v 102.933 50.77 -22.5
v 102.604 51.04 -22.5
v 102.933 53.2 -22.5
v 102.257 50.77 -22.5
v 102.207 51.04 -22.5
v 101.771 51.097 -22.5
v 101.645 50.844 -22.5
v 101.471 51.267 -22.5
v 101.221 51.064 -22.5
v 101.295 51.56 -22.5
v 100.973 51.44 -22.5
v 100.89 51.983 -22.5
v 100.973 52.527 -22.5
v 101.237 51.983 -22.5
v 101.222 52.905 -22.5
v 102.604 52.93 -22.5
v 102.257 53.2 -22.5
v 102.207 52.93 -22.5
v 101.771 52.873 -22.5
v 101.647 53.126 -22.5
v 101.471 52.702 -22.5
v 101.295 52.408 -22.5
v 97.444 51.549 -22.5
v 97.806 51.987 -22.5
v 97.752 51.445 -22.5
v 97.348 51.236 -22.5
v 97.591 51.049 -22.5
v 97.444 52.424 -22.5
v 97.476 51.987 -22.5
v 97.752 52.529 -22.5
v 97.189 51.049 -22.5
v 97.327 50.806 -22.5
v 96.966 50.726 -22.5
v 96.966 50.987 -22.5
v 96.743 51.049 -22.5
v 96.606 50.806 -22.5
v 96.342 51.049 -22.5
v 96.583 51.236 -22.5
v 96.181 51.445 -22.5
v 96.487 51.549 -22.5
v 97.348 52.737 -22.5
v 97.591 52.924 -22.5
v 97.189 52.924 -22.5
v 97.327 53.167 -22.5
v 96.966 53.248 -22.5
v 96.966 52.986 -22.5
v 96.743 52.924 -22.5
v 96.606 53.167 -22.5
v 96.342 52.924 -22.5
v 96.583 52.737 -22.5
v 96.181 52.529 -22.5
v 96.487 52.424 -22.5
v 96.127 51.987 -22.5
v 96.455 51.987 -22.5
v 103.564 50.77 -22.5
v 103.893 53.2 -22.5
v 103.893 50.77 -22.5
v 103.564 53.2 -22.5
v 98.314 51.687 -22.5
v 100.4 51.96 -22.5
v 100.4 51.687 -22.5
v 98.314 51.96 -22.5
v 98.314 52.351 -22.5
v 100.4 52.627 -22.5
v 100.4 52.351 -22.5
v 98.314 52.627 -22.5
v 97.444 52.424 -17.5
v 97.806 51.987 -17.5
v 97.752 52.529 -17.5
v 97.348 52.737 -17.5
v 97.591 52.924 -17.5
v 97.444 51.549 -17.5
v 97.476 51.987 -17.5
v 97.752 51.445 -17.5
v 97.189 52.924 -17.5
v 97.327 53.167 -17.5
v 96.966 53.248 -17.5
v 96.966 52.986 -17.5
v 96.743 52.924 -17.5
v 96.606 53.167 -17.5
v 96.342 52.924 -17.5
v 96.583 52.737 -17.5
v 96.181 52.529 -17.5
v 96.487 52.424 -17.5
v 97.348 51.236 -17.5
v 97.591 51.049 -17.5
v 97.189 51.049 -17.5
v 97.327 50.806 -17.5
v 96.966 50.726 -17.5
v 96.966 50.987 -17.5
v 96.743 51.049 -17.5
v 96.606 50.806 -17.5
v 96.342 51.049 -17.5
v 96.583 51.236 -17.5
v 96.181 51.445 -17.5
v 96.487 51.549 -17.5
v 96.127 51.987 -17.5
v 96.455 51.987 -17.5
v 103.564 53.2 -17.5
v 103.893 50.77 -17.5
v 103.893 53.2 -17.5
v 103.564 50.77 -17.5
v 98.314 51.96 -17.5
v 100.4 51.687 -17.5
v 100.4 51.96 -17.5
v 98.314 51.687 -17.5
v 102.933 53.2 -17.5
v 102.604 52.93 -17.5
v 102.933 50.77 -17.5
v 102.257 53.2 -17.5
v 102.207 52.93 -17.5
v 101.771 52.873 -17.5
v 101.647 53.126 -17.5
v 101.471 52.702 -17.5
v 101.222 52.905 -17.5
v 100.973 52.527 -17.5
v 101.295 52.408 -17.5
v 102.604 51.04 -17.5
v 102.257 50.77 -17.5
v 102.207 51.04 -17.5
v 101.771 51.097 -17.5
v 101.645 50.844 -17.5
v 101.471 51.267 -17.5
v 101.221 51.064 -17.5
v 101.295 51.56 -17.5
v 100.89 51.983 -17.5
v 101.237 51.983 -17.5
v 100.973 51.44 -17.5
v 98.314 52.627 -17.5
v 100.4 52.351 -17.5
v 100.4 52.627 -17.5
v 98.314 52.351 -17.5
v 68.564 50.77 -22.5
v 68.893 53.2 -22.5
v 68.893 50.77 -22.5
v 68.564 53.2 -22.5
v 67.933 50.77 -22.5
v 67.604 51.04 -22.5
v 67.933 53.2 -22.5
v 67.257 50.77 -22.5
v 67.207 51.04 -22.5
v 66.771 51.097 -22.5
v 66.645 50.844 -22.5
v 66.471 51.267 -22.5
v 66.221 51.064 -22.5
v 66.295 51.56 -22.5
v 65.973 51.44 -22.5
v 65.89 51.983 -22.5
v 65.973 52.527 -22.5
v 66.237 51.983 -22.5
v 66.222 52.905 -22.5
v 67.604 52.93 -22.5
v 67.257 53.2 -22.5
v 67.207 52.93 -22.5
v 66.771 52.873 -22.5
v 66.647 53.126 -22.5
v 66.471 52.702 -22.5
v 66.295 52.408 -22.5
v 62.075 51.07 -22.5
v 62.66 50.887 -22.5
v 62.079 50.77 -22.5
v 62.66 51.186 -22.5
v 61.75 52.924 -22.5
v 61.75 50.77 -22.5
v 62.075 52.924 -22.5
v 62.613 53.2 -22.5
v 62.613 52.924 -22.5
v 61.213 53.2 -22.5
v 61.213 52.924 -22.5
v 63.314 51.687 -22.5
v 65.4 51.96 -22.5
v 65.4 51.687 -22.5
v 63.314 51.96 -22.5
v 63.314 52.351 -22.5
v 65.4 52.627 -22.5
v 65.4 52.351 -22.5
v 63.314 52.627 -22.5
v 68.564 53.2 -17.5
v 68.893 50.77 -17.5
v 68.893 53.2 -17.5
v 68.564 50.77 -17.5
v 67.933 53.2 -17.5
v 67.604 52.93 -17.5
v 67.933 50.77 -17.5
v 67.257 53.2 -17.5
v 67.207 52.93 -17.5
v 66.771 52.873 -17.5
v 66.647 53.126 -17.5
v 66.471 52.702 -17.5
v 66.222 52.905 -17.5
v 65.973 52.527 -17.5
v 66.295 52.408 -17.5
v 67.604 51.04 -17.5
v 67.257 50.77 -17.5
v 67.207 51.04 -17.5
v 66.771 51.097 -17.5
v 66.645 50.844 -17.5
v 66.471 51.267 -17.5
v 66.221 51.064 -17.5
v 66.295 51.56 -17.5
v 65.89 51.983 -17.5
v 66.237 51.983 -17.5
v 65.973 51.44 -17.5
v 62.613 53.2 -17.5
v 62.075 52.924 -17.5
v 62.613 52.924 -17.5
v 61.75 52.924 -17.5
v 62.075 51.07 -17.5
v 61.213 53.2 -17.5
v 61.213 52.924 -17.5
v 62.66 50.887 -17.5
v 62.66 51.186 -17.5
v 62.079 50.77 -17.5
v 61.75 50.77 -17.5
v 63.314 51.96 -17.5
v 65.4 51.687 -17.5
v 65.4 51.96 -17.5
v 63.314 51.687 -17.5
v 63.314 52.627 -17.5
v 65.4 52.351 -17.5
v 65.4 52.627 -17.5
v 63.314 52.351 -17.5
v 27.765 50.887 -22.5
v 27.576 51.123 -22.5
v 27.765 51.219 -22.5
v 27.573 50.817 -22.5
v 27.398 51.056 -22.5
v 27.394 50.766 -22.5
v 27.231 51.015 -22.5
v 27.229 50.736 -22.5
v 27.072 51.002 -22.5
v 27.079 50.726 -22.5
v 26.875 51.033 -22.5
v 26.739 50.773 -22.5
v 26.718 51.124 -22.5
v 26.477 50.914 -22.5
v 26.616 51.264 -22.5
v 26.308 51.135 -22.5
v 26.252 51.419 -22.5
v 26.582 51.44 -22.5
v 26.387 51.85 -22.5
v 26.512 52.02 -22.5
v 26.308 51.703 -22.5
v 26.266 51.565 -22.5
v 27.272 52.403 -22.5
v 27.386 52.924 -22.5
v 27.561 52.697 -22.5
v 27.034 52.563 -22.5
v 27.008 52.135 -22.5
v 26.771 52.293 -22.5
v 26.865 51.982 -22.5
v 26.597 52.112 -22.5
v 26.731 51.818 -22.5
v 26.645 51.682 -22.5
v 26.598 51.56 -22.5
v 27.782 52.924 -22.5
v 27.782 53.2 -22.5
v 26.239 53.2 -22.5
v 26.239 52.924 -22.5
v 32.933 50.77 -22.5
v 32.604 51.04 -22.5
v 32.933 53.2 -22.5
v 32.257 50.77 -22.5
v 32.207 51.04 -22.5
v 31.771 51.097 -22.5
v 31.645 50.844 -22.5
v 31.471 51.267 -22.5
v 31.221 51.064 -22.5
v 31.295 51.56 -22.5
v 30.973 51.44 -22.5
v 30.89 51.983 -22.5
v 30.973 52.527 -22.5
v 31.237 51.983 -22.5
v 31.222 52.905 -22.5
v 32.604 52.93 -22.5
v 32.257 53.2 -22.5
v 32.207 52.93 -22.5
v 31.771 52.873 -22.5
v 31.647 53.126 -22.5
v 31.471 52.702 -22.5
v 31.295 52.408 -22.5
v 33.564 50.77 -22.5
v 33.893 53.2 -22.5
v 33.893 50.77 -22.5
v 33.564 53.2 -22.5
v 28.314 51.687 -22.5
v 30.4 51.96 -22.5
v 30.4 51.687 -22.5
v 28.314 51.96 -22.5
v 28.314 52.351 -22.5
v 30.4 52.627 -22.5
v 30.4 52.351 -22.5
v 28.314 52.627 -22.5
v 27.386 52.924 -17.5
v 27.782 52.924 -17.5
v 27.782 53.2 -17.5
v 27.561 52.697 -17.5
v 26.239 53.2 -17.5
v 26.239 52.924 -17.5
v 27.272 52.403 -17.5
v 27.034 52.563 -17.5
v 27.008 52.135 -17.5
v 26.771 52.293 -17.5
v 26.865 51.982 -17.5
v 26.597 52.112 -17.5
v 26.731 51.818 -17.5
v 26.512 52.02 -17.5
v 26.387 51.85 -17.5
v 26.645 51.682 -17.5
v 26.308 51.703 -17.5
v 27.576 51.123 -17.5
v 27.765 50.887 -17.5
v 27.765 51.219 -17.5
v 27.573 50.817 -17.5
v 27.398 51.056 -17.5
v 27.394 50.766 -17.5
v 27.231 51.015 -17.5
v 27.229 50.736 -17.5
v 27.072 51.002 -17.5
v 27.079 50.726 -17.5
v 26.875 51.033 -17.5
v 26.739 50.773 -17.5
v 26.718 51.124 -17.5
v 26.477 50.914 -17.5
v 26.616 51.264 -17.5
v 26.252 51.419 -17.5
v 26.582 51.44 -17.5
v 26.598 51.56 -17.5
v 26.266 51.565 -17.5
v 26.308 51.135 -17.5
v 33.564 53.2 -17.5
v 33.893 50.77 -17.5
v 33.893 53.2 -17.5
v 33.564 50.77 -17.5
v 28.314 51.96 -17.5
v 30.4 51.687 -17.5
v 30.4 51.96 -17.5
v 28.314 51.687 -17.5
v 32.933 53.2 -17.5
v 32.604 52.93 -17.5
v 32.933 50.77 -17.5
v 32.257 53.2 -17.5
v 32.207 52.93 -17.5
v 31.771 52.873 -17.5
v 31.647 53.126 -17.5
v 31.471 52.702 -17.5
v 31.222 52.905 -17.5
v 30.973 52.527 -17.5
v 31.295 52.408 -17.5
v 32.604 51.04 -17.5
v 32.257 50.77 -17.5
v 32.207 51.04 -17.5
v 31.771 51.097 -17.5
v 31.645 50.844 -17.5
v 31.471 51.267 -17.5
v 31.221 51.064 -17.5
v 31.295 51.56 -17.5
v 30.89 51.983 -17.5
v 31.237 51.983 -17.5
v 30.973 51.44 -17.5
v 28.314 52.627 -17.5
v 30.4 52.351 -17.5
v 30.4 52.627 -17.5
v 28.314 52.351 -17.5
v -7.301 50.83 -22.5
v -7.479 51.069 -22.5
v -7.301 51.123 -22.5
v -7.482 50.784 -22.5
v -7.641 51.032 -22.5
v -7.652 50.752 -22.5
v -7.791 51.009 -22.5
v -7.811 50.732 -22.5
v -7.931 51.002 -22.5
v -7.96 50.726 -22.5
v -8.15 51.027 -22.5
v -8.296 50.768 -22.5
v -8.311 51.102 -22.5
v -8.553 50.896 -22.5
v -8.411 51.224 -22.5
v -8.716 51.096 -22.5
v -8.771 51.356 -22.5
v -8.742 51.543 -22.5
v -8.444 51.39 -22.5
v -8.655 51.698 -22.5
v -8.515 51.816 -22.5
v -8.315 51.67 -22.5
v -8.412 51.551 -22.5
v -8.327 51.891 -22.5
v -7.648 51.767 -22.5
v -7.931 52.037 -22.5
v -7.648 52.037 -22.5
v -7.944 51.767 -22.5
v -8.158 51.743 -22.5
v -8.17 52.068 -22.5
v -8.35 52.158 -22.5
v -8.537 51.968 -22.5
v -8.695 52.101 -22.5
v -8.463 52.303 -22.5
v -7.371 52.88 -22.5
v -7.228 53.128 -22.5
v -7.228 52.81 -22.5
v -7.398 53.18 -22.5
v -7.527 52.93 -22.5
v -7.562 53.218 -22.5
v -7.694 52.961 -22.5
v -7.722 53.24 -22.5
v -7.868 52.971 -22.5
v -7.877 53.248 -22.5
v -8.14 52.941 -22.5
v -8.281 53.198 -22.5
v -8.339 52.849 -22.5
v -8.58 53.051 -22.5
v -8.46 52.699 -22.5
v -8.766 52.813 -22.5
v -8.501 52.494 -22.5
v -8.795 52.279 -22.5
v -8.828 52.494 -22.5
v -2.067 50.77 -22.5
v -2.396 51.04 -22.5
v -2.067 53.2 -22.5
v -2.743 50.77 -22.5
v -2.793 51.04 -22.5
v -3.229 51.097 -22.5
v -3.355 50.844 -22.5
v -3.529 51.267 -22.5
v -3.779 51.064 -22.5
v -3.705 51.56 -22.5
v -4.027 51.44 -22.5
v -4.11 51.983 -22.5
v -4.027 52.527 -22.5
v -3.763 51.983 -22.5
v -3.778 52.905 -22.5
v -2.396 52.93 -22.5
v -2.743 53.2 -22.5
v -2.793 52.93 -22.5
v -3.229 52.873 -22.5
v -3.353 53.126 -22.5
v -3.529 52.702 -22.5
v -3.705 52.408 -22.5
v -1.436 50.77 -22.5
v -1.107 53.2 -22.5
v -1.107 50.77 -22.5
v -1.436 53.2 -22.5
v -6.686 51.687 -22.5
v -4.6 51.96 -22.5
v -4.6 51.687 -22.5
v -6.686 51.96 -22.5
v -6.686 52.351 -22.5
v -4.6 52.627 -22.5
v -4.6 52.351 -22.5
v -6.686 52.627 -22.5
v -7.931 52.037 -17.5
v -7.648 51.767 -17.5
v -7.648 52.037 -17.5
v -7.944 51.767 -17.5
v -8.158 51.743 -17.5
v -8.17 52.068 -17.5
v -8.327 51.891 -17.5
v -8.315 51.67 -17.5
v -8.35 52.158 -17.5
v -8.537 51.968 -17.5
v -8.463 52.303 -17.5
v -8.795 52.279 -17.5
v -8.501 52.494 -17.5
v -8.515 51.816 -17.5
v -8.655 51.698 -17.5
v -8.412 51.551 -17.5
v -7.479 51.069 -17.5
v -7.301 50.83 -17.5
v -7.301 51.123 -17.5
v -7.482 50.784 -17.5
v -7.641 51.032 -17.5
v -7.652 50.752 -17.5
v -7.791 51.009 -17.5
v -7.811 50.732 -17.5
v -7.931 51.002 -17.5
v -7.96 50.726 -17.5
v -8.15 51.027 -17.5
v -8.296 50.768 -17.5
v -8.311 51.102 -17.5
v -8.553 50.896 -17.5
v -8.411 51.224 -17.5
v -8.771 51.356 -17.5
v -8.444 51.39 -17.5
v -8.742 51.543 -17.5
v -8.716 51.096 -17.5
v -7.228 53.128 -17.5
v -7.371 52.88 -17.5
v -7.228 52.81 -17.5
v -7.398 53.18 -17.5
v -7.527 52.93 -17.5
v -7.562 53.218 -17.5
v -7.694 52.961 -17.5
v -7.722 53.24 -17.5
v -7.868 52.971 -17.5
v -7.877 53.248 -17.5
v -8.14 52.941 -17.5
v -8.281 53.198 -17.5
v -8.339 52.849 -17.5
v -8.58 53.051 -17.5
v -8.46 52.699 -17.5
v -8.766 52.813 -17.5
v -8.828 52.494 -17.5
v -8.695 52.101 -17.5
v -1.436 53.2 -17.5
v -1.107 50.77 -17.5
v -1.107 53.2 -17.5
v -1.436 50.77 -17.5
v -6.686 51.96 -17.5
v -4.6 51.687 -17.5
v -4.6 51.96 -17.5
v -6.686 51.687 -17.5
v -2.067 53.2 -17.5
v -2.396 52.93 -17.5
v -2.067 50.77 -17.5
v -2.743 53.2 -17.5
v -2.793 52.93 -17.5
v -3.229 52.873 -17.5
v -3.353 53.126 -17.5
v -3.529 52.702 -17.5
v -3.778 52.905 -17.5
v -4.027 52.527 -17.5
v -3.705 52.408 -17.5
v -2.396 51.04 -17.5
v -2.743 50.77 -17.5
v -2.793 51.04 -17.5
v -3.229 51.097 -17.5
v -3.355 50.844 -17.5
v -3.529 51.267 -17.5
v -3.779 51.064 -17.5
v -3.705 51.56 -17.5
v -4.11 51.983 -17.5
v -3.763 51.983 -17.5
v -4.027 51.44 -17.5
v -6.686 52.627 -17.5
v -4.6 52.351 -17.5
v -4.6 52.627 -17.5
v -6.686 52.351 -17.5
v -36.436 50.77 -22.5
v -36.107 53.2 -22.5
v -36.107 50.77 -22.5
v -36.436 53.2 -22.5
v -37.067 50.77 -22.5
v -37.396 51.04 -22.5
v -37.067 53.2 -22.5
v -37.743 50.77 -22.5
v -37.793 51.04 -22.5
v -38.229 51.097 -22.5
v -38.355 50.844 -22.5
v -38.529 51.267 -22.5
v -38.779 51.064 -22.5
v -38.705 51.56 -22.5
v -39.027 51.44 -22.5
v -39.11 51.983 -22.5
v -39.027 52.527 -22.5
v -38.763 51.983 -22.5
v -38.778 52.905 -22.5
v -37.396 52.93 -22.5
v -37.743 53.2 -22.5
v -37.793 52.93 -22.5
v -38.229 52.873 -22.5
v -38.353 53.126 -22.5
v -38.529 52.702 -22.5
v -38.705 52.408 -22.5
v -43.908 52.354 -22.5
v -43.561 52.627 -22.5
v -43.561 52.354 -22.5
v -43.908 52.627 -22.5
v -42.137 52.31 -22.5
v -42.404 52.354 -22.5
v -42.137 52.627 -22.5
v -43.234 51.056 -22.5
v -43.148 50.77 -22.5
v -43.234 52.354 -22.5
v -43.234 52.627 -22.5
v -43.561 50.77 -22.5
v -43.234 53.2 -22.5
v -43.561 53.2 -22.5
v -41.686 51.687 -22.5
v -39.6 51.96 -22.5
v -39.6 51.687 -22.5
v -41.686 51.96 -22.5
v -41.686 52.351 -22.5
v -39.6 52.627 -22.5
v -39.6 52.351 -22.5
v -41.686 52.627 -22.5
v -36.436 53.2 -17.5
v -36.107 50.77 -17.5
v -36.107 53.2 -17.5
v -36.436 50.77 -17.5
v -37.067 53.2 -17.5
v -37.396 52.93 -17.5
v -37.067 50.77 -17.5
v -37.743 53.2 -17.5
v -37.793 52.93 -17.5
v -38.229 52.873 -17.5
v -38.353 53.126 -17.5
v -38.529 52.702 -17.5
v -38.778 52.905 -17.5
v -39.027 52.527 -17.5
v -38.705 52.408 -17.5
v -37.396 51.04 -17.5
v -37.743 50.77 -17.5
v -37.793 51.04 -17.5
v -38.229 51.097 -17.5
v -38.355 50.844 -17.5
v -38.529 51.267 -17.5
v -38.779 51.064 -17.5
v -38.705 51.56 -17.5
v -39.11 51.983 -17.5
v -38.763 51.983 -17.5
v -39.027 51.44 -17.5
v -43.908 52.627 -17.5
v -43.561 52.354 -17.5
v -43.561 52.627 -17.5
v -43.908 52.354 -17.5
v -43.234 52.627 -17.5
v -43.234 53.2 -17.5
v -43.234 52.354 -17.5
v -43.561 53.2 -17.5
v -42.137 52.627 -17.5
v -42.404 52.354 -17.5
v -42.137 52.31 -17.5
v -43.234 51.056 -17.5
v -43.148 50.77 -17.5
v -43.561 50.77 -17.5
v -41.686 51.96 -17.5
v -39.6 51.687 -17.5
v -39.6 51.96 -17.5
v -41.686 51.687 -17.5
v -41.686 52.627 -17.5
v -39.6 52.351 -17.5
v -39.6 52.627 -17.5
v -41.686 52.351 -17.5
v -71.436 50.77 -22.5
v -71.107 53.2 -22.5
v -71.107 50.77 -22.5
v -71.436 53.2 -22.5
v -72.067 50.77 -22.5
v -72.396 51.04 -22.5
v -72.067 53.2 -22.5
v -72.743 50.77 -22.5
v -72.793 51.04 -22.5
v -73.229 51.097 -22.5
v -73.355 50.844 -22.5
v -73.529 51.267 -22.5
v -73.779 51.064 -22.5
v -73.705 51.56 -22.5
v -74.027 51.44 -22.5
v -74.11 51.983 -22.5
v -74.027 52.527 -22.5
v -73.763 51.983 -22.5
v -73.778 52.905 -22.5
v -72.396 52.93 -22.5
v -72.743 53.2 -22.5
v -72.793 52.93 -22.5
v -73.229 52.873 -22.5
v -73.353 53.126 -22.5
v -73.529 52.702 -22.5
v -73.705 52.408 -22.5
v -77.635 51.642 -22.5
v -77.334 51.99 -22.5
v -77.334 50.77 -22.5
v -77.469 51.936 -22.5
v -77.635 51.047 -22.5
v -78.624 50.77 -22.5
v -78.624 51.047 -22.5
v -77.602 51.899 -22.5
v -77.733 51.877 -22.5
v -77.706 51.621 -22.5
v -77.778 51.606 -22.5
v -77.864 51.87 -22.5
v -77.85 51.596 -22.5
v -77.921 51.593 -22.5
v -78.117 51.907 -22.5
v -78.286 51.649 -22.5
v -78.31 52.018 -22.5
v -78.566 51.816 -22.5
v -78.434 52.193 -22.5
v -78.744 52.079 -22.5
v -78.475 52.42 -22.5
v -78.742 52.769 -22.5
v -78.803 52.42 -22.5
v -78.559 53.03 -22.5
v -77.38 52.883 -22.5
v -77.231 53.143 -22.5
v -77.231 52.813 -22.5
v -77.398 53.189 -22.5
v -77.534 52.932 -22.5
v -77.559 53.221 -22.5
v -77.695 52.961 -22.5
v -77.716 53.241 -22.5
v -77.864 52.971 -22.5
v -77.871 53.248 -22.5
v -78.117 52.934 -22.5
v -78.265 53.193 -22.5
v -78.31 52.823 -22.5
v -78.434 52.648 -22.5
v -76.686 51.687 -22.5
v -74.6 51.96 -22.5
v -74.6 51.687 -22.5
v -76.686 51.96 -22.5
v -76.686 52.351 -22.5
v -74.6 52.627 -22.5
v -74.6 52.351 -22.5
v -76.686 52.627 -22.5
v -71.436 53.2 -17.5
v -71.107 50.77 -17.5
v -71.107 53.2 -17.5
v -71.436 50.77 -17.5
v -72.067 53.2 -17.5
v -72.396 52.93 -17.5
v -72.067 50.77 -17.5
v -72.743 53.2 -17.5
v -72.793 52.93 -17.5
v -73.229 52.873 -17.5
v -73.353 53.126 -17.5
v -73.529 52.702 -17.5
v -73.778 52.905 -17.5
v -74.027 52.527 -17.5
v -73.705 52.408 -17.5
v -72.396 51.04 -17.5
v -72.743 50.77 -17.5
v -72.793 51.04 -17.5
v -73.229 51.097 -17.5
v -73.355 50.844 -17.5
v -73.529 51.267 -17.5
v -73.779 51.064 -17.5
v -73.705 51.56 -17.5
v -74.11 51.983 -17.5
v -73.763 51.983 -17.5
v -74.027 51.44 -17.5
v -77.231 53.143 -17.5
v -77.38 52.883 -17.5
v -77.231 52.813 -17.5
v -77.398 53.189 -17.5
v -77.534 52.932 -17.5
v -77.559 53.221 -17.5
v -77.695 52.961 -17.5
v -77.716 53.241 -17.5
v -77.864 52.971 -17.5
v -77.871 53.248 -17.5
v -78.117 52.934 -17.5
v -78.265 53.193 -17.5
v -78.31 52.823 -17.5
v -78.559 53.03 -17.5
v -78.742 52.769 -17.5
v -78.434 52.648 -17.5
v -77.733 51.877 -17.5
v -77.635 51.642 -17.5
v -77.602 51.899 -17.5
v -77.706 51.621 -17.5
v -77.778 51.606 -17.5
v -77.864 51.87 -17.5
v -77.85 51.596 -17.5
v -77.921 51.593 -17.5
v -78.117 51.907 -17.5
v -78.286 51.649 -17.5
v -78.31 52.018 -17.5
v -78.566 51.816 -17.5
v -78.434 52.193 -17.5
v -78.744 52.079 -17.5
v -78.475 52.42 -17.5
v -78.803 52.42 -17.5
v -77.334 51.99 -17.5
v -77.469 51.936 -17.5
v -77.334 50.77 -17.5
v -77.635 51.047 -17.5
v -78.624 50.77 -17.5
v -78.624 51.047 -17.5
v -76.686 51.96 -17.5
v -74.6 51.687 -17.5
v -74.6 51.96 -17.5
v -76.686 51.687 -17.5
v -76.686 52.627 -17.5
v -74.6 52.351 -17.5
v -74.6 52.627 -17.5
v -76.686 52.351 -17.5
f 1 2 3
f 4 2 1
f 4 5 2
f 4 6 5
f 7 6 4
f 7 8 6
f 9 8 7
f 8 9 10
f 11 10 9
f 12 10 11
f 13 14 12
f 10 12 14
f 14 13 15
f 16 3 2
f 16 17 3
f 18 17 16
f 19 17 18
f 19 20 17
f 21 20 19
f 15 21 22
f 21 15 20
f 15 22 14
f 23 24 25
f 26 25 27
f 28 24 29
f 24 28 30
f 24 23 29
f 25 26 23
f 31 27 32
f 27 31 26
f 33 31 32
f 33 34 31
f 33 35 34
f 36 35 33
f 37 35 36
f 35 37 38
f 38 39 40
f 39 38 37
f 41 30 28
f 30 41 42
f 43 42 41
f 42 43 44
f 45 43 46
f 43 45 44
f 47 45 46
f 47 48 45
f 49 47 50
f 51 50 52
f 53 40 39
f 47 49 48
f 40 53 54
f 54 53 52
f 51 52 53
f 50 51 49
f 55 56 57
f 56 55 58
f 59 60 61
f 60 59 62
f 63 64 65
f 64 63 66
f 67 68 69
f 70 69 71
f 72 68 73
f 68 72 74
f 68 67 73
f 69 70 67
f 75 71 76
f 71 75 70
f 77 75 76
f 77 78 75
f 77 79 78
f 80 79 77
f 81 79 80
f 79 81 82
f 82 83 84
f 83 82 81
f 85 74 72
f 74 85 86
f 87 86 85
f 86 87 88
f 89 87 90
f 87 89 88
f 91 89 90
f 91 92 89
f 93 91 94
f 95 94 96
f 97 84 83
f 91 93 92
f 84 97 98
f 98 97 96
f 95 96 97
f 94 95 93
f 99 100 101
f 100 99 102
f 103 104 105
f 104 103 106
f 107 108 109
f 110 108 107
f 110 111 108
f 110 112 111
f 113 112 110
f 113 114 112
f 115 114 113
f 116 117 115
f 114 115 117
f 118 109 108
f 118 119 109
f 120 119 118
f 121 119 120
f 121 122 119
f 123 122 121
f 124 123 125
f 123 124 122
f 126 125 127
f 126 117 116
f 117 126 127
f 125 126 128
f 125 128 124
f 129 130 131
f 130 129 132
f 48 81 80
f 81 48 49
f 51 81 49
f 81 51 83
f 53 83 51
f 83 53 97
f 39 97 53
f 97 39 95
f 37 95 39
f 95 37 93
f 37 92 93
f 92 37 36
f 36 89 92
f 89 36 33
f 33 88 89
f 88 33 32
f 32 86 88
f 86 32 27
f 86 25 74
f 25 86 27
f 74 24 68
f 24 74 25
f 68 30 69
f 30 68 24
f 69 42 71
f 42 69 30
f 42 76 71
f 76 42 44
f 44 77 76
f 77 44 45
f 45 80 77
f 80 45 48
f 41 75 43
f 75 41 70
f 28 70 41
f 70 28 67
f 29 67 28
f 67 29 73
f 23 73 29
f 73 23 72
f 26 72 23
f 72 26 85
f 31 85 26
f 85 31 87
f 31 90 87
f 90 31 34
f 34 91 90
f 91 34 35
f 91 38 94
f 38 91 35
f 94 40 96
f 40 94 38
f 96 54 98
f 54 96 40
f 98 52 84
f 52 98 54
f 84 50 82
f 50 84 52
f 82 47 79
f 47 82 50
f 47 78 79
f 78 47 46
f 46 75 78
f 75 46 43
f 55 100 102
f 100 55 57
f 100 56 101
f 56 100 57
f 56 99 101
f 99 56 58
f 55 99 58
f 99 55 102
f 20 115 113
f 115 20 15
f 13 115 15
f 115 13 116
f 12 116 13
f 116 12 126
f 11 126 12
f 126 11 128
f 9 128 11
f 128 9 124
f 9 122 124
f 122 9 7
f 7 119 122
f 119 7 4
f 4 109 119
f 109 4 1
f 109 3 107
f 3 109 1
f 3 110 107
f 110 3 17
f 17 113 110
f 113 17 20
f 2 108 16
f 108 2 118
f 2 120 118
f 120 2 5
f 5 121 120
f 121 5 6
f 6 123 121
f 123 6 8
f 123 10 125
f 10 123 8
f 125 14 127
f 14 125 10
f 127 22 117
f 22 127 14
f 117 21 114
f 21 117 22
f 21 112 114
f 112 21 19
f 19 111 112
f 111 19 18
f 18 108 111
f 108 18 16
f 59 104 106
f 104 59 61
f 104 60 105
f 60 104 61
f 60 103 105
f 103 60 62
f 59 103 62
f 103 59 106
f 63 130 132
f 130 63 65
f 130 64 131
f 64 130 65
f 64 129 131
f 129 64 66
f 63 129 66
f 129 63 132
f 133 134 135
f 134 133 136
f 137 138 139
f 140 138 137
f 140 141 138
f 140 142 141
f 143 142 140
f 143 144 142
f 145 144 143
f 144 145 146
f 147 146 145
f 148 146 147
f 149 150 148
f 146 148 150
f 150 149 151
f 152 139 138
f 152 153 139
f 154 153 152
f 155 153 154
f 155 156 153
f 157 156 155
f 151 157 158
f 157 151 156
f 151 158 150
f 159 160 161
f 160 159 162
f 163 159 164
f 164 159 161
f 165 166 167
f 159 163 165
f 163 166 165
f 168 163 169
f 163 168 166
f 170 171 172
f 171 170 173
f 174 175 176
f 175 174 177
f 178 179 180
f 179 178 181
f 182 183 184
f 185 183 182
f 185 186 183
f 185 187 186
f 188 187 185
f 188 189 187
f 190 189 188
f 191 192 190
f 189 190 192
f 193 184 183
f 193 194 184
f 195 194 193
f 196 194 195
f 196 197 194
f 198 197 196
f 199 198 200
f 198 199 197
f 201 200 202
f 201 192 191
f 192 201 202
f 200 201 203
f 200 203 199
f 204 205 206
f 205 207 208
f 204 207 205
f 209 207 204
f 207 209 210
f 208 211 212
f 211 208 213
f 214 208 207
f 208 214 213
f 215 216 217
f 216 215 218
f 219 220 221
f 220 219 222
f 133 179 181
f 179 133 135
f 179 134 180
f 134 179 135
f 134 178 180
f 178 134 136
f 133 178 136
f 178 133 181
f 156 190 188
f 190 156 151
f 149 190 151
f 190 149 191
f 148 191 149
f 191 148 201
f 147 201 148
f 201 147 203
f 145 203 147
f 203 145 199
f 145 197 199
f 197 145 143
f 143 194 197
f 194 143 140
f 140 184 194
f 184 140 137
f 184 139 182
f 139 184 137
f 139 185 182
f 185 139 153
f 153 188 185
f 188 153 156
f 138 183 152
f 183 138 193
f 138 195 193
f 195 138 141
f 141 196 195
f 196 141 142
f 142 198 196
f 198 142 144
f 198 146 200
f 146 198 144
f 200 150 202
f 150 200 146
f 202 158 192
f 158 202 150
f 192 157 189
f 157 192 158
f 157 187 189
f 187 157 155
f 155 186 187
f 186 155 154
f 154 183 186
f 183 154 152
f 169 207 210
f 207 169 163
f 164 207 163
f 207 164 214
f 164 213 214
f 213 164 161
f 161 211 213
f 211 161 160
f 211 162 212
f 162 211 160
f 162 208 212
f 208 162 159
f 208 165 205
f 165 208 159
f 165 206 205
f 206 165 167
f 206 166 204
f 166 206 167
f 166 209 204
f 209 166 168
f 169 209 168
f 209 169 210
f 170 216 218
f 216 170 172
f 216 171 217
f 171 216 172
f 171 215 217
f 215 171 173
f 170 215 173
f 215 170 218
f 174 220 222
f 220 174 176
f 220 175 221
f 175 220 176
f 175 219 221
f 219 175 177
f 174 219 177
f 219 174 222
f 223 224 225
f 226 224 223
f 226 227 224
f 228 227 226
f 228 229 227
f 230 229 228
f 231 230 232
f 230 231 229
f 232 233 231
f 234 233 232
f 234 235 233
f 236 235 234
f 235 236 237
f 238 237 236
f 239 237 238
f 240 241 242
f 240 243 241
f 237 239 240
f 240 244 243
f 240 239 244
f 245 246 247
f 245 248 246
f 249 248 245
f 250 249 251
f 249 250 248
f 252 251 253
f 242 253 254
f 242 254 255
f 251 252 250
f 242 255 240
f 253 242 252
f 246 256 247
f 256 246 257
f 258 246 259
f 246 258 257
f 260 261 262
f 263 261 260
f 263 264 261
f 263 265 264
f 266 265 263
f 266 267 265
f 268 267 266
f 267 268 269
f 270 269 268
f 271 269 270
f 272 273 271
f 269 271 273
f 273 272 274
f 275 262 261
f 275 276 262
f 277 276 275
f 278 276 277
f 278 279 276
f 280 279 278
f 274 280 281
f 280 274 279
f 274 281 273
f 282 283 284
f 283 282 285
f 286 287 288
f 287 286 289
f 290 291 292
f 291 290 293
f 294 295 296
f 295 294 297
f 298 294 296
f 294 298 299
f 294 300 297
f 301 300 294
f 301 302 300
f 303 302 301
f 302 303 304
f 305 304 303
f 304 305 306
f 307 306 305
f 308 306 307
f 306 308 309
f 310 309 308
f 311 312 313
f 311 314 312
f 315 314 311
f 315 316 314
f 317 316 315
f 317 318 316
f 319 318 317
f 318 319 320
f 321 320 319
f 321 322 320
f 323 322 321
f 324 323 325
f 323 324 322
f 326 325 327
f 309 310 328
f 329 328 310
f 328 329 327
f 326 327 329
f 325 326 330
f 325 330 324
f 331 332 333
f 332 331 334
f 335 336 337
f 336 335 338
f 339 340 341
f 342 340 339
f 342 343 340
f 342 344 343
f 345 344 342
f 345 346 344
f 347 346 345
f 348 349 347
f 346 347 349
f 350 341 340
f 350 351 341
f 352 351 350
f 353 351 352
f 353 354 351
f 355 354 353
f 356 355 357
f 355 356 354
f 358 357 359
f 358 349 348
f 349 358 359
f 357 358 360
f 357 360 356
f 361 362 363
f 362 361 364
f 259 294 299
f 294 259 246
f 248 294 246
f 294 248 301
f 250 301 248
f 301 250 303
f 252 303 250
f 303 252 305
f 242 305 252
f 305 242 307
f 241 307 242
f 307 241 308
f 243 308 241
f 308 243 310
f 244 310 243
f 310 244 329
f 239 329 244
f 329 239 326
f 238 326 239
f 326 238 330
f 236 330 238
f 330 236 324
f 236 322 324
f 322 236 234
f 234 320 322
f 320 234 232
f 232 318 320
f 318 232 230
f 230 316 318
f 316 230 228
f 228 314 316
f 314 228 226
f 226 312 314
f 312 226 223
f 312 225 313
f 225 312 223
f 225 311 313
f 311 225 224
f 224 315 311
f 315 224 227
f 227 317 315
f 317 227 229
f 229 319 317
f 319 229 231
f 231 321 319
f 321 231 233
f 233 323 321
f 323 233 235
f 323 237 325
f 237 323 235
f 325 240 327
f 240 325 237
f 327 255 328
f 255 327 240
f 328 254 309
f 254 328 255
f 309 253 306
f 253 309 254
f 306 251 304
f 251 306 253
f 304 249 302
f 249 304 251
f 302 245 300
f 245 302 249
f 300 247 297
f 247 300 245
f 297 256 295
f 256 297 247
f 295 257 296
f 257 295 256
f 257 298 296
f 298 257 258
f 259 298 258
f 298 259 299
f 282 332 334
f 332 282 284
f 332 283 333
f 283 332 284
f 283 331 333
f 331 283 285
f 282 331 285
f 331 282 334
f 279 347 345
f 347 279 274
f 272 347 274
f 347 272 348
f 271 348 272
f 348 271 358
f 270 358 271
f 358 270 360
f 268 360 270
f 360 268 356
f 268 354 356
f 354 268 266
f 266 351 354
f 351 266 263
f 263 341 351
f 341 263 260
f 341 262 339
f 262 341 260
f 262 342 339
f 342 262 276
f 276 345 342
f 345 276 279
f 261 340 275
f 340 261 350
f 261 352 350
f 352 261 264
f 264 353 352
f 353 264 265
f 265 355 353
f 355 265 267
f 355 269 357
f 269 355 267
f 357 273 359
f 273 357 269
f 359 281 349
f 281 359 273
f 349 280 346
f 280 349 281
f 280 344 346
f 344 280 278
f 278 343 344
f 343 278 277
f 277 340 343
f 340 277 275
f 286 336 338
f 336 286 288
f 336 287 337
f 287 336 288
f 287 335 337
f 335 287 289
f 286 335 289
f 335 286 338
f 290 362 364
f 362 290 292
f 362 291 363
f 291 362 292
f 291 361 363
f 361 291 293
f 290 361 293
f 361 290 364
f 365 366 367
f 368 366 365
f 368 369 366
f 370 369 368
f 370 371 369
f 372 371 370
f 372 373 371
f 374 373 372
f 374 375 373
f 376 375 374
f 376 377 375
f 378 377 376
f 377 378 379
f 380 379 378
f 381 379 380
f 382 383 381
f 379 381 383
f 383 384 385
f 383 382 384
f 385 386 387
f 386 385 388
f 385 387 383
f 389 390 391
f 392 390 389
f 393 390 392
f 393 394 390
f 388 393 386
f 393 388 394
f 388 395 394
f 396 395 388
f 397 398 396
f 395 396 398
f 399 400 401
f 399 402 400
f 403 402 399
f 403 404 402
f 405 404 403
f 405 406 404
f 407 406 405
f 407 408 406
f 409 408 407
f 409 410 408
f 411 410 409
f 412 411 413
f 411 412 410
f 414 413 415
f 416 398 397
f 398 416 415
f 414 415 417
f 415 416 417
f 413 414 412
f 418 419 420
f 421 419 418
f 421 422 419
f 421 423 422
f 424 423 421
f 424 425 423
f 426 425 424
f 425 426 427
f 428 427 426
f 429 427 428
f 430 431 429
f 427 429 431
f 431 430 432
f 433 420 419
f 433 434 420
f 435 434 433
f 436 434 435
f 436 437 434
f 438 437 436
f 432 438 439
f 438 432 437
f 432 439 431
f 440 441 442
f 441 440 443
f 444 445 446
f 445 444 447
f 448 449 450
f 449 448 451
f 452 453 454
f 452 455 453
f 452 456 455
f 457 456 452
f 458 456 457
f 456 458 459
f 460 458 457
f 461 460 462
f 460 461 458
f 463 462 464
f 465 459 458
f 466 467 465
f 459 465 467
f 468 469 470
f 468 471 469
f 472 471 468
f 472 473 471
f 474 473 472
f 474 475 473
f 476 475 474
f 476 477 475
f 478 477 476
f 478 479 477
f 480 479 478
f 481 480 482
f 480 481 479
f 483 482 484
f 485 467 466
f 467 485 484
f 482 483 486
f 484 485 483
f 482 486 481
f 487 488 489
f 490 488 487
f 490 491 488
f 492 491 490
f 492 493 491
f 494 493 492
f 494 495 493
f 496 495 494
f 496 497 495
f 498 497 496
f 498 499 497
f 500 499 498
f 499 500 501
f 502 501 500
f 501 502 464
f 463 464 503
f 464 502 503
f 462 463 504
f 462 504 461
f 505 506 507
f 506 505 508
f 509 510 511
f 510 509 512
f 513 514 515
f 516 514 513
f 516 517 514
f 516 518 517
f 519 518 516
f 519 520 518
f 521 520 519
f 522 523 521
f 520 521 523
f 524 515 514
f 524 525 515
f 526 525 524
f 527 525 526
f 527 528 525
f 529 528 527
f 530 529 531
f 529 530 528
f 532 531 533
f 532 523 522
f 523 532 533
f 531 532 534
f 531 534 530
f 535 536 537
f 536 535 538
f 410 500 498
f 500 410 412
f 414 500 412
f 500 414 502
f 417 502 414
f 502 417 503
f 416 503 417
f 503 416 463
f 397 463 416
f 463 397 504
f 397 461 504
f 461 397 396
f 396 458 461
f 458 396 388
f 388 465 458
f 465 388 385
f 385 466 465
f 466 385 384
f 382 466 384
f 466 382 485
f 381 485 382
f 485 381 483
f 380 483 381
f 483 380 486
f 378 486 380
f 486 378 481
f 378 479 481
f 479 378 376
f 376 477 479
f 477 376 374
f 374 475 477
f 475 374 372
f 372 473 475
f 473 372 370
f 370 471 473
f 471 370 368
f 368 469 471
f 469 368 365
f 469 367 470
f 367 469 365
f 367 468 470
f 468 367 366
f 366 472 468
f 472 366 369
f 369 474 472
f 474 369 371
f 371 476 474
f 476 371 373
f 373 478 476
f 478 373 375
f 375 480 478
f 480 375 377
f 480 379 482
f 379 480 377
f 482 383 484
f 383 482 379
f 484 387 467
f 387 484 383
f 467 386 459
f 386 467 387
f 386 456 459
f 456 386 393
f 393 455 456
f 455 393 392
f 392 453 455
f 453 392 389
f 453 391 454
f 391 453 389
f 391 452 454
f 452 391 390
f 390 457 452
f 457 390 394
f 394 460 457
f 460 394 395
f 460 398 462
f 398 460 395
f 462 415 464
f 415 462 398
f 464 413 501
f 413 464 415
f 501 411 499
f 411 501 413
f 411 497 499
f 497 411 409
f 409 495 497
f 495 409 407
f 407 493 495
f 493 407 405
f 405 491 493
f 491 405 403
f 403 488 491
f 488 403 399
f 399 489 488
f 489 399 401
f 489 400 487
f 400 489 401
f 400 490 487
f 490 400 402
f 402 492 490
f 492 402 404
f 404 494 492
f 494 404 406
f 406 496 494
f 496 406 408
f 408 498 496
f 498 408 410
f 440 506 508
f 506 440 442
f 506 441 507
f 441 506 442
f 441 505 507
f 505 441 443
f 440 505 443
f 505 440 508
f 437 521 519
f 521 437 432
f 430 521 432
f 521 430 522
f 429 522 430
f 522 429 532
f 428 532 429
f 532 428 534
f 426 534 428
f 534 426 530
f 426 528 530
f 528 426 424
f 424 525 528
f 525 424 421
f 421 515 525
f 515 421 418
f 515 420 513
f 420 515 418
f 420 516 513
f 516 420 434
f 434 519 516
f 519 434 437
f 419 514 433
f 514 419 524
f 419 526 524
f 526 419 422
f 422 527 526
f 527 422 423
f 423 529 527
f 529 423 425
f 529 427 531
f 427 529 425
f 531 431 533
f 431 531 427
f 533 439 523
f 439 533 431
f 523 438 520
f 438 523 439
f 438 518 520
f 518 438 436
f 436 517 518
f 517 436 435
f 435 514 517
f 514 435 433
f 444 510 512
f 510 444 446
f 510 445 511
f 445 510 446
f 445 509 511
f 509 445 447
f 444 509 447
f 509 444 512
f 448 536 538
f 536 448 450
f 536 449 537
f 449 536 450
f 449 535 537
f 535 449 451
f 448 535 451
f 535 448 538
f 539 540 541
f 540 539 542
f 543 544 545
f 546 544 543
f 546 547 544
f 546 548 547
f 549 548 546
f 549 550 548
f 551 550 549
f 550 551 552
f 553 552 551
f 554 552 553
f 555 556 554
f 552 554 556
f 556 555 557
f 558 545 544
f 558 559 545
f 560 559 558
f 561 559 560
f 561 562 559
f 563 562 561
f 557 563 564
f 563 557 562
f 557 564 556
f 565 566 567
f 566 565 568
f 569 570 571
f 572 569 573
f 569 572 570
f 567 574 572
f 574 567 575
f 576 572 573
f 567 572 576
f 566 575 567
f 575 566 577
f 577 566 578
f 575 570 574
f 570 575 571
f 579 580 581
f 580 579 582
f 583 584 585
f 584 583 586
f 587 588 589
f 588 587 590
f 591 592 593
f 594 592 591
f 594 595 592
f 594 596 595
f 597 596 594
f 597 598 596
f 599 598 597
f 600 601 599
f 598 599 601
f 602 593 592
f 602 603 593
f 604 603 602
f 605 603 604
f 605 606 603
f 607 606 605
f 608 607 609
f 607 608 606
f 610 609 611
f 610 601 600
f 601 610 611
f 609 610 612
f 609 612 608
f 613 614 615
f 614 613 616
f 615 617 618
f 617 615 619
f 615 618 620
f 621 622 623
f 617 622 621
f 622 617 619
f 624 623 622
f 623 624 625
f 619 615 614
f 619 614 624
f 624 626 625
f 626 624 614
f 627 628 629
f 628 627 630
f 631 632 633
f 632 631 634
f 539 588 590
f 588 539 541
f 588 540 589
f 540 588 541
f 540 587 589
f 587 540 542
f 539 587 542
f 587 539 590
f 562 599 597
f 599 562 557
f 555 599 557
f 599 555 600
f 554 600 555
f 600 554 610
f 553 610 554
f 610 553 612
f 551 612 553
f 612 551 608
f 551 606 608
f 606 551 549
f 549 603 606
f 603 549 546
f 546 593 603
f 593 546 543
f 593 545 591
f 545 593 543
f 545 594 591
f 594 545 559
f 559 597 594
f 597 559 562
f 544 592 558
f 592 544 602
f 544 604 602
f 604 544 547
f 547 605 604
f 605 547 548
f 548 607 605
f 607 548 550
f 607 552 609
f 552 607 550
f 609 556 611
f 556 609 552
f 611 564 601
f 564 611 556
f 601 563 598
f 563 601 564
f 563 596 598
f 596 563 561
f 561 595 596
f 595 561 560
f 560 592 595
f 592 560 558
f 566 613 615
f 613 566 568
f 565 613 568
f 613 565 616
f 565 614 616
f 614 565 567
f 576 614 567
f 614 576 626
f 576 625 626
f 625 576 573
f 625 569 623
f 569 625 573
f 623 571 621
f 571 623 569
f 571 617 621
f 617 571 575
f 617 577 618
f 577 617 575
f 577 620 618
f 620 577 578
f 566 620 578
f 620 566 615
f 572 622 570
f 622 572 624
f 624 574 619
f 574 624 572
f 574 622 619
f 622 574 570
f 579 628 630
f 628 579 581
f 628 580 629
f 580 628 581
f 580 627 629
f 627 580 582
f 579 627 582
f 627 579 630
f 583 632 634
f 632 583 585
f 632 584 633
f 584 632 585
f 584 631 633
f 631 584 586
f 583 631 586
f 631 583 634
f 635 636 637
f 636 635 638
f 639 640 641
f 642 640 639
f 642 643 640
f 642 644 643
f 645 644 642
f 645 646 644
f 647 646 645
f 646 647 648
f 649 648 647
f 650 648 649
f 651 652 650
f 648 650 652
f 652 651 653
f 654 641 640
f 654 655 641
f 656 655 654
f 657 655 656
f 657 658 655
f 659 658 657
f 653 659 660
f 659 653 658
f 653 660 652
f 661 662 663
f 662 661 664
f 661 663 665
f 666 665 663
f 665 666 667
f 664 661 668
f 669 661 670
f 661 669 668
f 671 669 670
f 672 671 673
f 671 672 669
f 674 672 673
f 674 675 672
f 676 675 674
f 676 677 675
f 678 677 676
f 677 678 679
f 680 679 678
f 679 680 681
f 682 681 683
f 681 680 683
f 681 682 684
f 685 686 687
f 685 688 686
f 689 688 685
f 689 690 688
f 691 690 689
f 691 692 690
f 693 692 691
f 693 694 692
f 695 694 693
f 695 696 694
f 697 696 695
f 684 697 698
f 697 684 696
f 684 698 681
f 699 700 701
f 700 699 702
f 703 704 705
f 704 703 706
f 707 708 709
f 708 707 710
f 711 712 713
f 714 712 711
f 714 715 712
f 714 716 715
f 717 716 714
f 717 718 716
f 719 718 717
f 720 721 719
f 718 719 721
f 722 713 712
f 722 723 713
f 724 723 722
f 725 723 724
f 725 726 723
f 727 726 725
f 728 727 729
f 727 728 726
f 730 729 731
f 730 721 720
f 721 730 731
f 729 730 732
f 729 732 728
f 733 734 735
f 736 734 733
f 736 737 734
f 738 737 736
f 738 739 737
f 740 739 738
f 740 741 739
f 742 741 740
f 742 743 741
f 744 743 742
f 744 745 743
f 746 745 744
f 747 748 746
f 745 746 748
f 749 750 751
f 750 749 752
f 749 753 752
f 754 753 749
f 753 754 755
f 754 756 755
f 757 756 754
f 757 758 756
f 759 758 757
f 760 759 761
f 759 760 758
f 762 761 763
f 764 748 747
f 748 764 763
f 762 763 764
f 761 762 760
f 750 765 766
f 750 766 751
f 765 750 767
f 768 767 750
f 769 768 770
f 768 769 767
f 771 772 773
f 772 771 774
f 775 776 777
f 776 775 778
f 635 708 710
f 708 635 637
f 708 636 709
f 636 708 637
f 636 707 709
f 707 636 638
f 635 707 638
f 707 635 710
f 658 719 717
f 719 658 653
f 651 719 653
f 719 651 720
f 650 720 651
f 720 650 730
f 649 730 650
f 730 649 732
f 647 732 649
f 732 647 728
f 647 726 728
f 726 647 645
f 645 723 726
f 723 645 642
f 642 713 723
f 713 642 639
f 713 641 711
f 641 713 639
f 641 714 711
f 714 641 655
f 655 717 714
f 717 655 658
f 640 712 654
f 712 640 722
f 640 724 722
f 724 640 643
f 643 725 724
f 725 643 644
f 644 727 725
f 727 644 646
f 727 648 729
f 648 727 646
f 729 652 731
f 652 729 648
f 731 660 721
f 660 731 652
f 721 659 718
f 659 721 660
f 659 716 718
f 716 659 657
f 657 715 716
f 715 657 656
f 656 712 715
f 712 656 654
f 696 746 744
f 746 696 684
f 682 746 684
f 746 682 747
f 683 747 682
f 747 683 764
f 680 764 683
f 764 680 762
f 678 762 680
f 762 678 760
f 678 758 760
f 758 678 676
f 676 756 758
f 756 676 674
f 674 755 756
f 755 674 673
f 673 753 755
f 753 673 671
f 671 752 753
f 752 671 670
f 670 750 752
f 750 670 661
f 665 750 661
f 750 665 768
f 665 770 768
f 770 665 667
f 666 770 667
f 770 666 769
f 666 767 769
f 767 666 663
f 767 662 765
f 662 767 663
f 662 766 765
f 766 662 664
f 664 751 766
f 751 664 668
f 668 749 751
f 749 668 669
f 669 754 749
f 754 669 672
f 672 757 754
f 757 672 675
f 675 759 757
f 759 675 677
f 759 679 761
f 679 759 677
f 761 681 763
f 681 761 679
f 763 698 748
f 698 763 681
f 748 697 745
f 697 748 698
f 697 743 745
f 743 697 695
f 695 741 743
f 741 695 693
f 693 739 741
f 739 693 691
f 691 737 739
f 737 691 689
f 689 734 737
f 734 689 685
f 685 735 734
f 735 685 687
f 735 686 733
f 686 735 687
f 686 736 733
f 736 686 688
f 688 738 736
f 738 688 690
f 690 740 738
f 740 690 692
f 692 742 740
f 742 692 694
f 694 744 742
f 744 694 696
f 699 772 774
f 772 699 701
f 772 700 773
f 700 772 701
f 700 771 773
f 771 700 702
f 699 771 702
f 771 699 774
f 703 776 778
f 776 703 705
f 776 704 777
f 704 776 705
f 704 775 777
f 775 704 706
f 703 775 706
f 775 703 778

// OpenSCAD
// file: modules.scad
zoom = [0.8,0.8,1];

module white( filename, text)
{
    scale(zoom)
    rotate([0,0,90]) 
    union(){ 
        translate([21.5,-8.4,-2.5])   rotate([0,0,90])  linear_extrude(5)  text (text,font="bold",size=3); 
        intersection() 
        {    
            cube([35,35,5],center=true); 
            translate([3,0,2.6])    scale([0.14,0.14,-1])  
            surface(file = filename, center = true); 
        } 
    } 

};

module black( filename, text)
{
    scale(zoom)
    rotate([0,0,90]) 
    difference() 
    {    
        translate([5,0,0])  cube([35,35,5],center=true); 
        translate([3,0,2.6])    scale([0.14,0.14,-1])  
        surface(file = filename, center = true);
        translate([21.5,-8.4,-2.5])   rotate([0,0,90])  linear_extrude(6)  text (text,font="bold",size=3);
    } 
}

module shape()
{
    scale(zoom)   rotate([0,0,90]) translate([5,0,0])  cube([35,35,5],center=true);  
}
// main file
include <modules.scad>

offset = 35;
bord = 97.5;


union() color([0,0,1])
{
    translate([bord,36,-20])              white("../aruco/Marker0.png","ID=0");    
    translate([bord-offset,36,-20])              white("../aruco/Marker1.png","ID=1");    
    translate([bord-2*offset,36,-20])              white("../aruco/Marker2.png","ID=2");    
    translate([bord-3*offset,36,-20])              white("../aruco/Marker3.png","ID=3");    
    translate([bord-4*offset,36,-20])              white("../aruco/Marker4.png","ID=4");    
    translate([bord-5*offset,36,-20])              white("../aruco/Marker5.png","ID=5");
}
